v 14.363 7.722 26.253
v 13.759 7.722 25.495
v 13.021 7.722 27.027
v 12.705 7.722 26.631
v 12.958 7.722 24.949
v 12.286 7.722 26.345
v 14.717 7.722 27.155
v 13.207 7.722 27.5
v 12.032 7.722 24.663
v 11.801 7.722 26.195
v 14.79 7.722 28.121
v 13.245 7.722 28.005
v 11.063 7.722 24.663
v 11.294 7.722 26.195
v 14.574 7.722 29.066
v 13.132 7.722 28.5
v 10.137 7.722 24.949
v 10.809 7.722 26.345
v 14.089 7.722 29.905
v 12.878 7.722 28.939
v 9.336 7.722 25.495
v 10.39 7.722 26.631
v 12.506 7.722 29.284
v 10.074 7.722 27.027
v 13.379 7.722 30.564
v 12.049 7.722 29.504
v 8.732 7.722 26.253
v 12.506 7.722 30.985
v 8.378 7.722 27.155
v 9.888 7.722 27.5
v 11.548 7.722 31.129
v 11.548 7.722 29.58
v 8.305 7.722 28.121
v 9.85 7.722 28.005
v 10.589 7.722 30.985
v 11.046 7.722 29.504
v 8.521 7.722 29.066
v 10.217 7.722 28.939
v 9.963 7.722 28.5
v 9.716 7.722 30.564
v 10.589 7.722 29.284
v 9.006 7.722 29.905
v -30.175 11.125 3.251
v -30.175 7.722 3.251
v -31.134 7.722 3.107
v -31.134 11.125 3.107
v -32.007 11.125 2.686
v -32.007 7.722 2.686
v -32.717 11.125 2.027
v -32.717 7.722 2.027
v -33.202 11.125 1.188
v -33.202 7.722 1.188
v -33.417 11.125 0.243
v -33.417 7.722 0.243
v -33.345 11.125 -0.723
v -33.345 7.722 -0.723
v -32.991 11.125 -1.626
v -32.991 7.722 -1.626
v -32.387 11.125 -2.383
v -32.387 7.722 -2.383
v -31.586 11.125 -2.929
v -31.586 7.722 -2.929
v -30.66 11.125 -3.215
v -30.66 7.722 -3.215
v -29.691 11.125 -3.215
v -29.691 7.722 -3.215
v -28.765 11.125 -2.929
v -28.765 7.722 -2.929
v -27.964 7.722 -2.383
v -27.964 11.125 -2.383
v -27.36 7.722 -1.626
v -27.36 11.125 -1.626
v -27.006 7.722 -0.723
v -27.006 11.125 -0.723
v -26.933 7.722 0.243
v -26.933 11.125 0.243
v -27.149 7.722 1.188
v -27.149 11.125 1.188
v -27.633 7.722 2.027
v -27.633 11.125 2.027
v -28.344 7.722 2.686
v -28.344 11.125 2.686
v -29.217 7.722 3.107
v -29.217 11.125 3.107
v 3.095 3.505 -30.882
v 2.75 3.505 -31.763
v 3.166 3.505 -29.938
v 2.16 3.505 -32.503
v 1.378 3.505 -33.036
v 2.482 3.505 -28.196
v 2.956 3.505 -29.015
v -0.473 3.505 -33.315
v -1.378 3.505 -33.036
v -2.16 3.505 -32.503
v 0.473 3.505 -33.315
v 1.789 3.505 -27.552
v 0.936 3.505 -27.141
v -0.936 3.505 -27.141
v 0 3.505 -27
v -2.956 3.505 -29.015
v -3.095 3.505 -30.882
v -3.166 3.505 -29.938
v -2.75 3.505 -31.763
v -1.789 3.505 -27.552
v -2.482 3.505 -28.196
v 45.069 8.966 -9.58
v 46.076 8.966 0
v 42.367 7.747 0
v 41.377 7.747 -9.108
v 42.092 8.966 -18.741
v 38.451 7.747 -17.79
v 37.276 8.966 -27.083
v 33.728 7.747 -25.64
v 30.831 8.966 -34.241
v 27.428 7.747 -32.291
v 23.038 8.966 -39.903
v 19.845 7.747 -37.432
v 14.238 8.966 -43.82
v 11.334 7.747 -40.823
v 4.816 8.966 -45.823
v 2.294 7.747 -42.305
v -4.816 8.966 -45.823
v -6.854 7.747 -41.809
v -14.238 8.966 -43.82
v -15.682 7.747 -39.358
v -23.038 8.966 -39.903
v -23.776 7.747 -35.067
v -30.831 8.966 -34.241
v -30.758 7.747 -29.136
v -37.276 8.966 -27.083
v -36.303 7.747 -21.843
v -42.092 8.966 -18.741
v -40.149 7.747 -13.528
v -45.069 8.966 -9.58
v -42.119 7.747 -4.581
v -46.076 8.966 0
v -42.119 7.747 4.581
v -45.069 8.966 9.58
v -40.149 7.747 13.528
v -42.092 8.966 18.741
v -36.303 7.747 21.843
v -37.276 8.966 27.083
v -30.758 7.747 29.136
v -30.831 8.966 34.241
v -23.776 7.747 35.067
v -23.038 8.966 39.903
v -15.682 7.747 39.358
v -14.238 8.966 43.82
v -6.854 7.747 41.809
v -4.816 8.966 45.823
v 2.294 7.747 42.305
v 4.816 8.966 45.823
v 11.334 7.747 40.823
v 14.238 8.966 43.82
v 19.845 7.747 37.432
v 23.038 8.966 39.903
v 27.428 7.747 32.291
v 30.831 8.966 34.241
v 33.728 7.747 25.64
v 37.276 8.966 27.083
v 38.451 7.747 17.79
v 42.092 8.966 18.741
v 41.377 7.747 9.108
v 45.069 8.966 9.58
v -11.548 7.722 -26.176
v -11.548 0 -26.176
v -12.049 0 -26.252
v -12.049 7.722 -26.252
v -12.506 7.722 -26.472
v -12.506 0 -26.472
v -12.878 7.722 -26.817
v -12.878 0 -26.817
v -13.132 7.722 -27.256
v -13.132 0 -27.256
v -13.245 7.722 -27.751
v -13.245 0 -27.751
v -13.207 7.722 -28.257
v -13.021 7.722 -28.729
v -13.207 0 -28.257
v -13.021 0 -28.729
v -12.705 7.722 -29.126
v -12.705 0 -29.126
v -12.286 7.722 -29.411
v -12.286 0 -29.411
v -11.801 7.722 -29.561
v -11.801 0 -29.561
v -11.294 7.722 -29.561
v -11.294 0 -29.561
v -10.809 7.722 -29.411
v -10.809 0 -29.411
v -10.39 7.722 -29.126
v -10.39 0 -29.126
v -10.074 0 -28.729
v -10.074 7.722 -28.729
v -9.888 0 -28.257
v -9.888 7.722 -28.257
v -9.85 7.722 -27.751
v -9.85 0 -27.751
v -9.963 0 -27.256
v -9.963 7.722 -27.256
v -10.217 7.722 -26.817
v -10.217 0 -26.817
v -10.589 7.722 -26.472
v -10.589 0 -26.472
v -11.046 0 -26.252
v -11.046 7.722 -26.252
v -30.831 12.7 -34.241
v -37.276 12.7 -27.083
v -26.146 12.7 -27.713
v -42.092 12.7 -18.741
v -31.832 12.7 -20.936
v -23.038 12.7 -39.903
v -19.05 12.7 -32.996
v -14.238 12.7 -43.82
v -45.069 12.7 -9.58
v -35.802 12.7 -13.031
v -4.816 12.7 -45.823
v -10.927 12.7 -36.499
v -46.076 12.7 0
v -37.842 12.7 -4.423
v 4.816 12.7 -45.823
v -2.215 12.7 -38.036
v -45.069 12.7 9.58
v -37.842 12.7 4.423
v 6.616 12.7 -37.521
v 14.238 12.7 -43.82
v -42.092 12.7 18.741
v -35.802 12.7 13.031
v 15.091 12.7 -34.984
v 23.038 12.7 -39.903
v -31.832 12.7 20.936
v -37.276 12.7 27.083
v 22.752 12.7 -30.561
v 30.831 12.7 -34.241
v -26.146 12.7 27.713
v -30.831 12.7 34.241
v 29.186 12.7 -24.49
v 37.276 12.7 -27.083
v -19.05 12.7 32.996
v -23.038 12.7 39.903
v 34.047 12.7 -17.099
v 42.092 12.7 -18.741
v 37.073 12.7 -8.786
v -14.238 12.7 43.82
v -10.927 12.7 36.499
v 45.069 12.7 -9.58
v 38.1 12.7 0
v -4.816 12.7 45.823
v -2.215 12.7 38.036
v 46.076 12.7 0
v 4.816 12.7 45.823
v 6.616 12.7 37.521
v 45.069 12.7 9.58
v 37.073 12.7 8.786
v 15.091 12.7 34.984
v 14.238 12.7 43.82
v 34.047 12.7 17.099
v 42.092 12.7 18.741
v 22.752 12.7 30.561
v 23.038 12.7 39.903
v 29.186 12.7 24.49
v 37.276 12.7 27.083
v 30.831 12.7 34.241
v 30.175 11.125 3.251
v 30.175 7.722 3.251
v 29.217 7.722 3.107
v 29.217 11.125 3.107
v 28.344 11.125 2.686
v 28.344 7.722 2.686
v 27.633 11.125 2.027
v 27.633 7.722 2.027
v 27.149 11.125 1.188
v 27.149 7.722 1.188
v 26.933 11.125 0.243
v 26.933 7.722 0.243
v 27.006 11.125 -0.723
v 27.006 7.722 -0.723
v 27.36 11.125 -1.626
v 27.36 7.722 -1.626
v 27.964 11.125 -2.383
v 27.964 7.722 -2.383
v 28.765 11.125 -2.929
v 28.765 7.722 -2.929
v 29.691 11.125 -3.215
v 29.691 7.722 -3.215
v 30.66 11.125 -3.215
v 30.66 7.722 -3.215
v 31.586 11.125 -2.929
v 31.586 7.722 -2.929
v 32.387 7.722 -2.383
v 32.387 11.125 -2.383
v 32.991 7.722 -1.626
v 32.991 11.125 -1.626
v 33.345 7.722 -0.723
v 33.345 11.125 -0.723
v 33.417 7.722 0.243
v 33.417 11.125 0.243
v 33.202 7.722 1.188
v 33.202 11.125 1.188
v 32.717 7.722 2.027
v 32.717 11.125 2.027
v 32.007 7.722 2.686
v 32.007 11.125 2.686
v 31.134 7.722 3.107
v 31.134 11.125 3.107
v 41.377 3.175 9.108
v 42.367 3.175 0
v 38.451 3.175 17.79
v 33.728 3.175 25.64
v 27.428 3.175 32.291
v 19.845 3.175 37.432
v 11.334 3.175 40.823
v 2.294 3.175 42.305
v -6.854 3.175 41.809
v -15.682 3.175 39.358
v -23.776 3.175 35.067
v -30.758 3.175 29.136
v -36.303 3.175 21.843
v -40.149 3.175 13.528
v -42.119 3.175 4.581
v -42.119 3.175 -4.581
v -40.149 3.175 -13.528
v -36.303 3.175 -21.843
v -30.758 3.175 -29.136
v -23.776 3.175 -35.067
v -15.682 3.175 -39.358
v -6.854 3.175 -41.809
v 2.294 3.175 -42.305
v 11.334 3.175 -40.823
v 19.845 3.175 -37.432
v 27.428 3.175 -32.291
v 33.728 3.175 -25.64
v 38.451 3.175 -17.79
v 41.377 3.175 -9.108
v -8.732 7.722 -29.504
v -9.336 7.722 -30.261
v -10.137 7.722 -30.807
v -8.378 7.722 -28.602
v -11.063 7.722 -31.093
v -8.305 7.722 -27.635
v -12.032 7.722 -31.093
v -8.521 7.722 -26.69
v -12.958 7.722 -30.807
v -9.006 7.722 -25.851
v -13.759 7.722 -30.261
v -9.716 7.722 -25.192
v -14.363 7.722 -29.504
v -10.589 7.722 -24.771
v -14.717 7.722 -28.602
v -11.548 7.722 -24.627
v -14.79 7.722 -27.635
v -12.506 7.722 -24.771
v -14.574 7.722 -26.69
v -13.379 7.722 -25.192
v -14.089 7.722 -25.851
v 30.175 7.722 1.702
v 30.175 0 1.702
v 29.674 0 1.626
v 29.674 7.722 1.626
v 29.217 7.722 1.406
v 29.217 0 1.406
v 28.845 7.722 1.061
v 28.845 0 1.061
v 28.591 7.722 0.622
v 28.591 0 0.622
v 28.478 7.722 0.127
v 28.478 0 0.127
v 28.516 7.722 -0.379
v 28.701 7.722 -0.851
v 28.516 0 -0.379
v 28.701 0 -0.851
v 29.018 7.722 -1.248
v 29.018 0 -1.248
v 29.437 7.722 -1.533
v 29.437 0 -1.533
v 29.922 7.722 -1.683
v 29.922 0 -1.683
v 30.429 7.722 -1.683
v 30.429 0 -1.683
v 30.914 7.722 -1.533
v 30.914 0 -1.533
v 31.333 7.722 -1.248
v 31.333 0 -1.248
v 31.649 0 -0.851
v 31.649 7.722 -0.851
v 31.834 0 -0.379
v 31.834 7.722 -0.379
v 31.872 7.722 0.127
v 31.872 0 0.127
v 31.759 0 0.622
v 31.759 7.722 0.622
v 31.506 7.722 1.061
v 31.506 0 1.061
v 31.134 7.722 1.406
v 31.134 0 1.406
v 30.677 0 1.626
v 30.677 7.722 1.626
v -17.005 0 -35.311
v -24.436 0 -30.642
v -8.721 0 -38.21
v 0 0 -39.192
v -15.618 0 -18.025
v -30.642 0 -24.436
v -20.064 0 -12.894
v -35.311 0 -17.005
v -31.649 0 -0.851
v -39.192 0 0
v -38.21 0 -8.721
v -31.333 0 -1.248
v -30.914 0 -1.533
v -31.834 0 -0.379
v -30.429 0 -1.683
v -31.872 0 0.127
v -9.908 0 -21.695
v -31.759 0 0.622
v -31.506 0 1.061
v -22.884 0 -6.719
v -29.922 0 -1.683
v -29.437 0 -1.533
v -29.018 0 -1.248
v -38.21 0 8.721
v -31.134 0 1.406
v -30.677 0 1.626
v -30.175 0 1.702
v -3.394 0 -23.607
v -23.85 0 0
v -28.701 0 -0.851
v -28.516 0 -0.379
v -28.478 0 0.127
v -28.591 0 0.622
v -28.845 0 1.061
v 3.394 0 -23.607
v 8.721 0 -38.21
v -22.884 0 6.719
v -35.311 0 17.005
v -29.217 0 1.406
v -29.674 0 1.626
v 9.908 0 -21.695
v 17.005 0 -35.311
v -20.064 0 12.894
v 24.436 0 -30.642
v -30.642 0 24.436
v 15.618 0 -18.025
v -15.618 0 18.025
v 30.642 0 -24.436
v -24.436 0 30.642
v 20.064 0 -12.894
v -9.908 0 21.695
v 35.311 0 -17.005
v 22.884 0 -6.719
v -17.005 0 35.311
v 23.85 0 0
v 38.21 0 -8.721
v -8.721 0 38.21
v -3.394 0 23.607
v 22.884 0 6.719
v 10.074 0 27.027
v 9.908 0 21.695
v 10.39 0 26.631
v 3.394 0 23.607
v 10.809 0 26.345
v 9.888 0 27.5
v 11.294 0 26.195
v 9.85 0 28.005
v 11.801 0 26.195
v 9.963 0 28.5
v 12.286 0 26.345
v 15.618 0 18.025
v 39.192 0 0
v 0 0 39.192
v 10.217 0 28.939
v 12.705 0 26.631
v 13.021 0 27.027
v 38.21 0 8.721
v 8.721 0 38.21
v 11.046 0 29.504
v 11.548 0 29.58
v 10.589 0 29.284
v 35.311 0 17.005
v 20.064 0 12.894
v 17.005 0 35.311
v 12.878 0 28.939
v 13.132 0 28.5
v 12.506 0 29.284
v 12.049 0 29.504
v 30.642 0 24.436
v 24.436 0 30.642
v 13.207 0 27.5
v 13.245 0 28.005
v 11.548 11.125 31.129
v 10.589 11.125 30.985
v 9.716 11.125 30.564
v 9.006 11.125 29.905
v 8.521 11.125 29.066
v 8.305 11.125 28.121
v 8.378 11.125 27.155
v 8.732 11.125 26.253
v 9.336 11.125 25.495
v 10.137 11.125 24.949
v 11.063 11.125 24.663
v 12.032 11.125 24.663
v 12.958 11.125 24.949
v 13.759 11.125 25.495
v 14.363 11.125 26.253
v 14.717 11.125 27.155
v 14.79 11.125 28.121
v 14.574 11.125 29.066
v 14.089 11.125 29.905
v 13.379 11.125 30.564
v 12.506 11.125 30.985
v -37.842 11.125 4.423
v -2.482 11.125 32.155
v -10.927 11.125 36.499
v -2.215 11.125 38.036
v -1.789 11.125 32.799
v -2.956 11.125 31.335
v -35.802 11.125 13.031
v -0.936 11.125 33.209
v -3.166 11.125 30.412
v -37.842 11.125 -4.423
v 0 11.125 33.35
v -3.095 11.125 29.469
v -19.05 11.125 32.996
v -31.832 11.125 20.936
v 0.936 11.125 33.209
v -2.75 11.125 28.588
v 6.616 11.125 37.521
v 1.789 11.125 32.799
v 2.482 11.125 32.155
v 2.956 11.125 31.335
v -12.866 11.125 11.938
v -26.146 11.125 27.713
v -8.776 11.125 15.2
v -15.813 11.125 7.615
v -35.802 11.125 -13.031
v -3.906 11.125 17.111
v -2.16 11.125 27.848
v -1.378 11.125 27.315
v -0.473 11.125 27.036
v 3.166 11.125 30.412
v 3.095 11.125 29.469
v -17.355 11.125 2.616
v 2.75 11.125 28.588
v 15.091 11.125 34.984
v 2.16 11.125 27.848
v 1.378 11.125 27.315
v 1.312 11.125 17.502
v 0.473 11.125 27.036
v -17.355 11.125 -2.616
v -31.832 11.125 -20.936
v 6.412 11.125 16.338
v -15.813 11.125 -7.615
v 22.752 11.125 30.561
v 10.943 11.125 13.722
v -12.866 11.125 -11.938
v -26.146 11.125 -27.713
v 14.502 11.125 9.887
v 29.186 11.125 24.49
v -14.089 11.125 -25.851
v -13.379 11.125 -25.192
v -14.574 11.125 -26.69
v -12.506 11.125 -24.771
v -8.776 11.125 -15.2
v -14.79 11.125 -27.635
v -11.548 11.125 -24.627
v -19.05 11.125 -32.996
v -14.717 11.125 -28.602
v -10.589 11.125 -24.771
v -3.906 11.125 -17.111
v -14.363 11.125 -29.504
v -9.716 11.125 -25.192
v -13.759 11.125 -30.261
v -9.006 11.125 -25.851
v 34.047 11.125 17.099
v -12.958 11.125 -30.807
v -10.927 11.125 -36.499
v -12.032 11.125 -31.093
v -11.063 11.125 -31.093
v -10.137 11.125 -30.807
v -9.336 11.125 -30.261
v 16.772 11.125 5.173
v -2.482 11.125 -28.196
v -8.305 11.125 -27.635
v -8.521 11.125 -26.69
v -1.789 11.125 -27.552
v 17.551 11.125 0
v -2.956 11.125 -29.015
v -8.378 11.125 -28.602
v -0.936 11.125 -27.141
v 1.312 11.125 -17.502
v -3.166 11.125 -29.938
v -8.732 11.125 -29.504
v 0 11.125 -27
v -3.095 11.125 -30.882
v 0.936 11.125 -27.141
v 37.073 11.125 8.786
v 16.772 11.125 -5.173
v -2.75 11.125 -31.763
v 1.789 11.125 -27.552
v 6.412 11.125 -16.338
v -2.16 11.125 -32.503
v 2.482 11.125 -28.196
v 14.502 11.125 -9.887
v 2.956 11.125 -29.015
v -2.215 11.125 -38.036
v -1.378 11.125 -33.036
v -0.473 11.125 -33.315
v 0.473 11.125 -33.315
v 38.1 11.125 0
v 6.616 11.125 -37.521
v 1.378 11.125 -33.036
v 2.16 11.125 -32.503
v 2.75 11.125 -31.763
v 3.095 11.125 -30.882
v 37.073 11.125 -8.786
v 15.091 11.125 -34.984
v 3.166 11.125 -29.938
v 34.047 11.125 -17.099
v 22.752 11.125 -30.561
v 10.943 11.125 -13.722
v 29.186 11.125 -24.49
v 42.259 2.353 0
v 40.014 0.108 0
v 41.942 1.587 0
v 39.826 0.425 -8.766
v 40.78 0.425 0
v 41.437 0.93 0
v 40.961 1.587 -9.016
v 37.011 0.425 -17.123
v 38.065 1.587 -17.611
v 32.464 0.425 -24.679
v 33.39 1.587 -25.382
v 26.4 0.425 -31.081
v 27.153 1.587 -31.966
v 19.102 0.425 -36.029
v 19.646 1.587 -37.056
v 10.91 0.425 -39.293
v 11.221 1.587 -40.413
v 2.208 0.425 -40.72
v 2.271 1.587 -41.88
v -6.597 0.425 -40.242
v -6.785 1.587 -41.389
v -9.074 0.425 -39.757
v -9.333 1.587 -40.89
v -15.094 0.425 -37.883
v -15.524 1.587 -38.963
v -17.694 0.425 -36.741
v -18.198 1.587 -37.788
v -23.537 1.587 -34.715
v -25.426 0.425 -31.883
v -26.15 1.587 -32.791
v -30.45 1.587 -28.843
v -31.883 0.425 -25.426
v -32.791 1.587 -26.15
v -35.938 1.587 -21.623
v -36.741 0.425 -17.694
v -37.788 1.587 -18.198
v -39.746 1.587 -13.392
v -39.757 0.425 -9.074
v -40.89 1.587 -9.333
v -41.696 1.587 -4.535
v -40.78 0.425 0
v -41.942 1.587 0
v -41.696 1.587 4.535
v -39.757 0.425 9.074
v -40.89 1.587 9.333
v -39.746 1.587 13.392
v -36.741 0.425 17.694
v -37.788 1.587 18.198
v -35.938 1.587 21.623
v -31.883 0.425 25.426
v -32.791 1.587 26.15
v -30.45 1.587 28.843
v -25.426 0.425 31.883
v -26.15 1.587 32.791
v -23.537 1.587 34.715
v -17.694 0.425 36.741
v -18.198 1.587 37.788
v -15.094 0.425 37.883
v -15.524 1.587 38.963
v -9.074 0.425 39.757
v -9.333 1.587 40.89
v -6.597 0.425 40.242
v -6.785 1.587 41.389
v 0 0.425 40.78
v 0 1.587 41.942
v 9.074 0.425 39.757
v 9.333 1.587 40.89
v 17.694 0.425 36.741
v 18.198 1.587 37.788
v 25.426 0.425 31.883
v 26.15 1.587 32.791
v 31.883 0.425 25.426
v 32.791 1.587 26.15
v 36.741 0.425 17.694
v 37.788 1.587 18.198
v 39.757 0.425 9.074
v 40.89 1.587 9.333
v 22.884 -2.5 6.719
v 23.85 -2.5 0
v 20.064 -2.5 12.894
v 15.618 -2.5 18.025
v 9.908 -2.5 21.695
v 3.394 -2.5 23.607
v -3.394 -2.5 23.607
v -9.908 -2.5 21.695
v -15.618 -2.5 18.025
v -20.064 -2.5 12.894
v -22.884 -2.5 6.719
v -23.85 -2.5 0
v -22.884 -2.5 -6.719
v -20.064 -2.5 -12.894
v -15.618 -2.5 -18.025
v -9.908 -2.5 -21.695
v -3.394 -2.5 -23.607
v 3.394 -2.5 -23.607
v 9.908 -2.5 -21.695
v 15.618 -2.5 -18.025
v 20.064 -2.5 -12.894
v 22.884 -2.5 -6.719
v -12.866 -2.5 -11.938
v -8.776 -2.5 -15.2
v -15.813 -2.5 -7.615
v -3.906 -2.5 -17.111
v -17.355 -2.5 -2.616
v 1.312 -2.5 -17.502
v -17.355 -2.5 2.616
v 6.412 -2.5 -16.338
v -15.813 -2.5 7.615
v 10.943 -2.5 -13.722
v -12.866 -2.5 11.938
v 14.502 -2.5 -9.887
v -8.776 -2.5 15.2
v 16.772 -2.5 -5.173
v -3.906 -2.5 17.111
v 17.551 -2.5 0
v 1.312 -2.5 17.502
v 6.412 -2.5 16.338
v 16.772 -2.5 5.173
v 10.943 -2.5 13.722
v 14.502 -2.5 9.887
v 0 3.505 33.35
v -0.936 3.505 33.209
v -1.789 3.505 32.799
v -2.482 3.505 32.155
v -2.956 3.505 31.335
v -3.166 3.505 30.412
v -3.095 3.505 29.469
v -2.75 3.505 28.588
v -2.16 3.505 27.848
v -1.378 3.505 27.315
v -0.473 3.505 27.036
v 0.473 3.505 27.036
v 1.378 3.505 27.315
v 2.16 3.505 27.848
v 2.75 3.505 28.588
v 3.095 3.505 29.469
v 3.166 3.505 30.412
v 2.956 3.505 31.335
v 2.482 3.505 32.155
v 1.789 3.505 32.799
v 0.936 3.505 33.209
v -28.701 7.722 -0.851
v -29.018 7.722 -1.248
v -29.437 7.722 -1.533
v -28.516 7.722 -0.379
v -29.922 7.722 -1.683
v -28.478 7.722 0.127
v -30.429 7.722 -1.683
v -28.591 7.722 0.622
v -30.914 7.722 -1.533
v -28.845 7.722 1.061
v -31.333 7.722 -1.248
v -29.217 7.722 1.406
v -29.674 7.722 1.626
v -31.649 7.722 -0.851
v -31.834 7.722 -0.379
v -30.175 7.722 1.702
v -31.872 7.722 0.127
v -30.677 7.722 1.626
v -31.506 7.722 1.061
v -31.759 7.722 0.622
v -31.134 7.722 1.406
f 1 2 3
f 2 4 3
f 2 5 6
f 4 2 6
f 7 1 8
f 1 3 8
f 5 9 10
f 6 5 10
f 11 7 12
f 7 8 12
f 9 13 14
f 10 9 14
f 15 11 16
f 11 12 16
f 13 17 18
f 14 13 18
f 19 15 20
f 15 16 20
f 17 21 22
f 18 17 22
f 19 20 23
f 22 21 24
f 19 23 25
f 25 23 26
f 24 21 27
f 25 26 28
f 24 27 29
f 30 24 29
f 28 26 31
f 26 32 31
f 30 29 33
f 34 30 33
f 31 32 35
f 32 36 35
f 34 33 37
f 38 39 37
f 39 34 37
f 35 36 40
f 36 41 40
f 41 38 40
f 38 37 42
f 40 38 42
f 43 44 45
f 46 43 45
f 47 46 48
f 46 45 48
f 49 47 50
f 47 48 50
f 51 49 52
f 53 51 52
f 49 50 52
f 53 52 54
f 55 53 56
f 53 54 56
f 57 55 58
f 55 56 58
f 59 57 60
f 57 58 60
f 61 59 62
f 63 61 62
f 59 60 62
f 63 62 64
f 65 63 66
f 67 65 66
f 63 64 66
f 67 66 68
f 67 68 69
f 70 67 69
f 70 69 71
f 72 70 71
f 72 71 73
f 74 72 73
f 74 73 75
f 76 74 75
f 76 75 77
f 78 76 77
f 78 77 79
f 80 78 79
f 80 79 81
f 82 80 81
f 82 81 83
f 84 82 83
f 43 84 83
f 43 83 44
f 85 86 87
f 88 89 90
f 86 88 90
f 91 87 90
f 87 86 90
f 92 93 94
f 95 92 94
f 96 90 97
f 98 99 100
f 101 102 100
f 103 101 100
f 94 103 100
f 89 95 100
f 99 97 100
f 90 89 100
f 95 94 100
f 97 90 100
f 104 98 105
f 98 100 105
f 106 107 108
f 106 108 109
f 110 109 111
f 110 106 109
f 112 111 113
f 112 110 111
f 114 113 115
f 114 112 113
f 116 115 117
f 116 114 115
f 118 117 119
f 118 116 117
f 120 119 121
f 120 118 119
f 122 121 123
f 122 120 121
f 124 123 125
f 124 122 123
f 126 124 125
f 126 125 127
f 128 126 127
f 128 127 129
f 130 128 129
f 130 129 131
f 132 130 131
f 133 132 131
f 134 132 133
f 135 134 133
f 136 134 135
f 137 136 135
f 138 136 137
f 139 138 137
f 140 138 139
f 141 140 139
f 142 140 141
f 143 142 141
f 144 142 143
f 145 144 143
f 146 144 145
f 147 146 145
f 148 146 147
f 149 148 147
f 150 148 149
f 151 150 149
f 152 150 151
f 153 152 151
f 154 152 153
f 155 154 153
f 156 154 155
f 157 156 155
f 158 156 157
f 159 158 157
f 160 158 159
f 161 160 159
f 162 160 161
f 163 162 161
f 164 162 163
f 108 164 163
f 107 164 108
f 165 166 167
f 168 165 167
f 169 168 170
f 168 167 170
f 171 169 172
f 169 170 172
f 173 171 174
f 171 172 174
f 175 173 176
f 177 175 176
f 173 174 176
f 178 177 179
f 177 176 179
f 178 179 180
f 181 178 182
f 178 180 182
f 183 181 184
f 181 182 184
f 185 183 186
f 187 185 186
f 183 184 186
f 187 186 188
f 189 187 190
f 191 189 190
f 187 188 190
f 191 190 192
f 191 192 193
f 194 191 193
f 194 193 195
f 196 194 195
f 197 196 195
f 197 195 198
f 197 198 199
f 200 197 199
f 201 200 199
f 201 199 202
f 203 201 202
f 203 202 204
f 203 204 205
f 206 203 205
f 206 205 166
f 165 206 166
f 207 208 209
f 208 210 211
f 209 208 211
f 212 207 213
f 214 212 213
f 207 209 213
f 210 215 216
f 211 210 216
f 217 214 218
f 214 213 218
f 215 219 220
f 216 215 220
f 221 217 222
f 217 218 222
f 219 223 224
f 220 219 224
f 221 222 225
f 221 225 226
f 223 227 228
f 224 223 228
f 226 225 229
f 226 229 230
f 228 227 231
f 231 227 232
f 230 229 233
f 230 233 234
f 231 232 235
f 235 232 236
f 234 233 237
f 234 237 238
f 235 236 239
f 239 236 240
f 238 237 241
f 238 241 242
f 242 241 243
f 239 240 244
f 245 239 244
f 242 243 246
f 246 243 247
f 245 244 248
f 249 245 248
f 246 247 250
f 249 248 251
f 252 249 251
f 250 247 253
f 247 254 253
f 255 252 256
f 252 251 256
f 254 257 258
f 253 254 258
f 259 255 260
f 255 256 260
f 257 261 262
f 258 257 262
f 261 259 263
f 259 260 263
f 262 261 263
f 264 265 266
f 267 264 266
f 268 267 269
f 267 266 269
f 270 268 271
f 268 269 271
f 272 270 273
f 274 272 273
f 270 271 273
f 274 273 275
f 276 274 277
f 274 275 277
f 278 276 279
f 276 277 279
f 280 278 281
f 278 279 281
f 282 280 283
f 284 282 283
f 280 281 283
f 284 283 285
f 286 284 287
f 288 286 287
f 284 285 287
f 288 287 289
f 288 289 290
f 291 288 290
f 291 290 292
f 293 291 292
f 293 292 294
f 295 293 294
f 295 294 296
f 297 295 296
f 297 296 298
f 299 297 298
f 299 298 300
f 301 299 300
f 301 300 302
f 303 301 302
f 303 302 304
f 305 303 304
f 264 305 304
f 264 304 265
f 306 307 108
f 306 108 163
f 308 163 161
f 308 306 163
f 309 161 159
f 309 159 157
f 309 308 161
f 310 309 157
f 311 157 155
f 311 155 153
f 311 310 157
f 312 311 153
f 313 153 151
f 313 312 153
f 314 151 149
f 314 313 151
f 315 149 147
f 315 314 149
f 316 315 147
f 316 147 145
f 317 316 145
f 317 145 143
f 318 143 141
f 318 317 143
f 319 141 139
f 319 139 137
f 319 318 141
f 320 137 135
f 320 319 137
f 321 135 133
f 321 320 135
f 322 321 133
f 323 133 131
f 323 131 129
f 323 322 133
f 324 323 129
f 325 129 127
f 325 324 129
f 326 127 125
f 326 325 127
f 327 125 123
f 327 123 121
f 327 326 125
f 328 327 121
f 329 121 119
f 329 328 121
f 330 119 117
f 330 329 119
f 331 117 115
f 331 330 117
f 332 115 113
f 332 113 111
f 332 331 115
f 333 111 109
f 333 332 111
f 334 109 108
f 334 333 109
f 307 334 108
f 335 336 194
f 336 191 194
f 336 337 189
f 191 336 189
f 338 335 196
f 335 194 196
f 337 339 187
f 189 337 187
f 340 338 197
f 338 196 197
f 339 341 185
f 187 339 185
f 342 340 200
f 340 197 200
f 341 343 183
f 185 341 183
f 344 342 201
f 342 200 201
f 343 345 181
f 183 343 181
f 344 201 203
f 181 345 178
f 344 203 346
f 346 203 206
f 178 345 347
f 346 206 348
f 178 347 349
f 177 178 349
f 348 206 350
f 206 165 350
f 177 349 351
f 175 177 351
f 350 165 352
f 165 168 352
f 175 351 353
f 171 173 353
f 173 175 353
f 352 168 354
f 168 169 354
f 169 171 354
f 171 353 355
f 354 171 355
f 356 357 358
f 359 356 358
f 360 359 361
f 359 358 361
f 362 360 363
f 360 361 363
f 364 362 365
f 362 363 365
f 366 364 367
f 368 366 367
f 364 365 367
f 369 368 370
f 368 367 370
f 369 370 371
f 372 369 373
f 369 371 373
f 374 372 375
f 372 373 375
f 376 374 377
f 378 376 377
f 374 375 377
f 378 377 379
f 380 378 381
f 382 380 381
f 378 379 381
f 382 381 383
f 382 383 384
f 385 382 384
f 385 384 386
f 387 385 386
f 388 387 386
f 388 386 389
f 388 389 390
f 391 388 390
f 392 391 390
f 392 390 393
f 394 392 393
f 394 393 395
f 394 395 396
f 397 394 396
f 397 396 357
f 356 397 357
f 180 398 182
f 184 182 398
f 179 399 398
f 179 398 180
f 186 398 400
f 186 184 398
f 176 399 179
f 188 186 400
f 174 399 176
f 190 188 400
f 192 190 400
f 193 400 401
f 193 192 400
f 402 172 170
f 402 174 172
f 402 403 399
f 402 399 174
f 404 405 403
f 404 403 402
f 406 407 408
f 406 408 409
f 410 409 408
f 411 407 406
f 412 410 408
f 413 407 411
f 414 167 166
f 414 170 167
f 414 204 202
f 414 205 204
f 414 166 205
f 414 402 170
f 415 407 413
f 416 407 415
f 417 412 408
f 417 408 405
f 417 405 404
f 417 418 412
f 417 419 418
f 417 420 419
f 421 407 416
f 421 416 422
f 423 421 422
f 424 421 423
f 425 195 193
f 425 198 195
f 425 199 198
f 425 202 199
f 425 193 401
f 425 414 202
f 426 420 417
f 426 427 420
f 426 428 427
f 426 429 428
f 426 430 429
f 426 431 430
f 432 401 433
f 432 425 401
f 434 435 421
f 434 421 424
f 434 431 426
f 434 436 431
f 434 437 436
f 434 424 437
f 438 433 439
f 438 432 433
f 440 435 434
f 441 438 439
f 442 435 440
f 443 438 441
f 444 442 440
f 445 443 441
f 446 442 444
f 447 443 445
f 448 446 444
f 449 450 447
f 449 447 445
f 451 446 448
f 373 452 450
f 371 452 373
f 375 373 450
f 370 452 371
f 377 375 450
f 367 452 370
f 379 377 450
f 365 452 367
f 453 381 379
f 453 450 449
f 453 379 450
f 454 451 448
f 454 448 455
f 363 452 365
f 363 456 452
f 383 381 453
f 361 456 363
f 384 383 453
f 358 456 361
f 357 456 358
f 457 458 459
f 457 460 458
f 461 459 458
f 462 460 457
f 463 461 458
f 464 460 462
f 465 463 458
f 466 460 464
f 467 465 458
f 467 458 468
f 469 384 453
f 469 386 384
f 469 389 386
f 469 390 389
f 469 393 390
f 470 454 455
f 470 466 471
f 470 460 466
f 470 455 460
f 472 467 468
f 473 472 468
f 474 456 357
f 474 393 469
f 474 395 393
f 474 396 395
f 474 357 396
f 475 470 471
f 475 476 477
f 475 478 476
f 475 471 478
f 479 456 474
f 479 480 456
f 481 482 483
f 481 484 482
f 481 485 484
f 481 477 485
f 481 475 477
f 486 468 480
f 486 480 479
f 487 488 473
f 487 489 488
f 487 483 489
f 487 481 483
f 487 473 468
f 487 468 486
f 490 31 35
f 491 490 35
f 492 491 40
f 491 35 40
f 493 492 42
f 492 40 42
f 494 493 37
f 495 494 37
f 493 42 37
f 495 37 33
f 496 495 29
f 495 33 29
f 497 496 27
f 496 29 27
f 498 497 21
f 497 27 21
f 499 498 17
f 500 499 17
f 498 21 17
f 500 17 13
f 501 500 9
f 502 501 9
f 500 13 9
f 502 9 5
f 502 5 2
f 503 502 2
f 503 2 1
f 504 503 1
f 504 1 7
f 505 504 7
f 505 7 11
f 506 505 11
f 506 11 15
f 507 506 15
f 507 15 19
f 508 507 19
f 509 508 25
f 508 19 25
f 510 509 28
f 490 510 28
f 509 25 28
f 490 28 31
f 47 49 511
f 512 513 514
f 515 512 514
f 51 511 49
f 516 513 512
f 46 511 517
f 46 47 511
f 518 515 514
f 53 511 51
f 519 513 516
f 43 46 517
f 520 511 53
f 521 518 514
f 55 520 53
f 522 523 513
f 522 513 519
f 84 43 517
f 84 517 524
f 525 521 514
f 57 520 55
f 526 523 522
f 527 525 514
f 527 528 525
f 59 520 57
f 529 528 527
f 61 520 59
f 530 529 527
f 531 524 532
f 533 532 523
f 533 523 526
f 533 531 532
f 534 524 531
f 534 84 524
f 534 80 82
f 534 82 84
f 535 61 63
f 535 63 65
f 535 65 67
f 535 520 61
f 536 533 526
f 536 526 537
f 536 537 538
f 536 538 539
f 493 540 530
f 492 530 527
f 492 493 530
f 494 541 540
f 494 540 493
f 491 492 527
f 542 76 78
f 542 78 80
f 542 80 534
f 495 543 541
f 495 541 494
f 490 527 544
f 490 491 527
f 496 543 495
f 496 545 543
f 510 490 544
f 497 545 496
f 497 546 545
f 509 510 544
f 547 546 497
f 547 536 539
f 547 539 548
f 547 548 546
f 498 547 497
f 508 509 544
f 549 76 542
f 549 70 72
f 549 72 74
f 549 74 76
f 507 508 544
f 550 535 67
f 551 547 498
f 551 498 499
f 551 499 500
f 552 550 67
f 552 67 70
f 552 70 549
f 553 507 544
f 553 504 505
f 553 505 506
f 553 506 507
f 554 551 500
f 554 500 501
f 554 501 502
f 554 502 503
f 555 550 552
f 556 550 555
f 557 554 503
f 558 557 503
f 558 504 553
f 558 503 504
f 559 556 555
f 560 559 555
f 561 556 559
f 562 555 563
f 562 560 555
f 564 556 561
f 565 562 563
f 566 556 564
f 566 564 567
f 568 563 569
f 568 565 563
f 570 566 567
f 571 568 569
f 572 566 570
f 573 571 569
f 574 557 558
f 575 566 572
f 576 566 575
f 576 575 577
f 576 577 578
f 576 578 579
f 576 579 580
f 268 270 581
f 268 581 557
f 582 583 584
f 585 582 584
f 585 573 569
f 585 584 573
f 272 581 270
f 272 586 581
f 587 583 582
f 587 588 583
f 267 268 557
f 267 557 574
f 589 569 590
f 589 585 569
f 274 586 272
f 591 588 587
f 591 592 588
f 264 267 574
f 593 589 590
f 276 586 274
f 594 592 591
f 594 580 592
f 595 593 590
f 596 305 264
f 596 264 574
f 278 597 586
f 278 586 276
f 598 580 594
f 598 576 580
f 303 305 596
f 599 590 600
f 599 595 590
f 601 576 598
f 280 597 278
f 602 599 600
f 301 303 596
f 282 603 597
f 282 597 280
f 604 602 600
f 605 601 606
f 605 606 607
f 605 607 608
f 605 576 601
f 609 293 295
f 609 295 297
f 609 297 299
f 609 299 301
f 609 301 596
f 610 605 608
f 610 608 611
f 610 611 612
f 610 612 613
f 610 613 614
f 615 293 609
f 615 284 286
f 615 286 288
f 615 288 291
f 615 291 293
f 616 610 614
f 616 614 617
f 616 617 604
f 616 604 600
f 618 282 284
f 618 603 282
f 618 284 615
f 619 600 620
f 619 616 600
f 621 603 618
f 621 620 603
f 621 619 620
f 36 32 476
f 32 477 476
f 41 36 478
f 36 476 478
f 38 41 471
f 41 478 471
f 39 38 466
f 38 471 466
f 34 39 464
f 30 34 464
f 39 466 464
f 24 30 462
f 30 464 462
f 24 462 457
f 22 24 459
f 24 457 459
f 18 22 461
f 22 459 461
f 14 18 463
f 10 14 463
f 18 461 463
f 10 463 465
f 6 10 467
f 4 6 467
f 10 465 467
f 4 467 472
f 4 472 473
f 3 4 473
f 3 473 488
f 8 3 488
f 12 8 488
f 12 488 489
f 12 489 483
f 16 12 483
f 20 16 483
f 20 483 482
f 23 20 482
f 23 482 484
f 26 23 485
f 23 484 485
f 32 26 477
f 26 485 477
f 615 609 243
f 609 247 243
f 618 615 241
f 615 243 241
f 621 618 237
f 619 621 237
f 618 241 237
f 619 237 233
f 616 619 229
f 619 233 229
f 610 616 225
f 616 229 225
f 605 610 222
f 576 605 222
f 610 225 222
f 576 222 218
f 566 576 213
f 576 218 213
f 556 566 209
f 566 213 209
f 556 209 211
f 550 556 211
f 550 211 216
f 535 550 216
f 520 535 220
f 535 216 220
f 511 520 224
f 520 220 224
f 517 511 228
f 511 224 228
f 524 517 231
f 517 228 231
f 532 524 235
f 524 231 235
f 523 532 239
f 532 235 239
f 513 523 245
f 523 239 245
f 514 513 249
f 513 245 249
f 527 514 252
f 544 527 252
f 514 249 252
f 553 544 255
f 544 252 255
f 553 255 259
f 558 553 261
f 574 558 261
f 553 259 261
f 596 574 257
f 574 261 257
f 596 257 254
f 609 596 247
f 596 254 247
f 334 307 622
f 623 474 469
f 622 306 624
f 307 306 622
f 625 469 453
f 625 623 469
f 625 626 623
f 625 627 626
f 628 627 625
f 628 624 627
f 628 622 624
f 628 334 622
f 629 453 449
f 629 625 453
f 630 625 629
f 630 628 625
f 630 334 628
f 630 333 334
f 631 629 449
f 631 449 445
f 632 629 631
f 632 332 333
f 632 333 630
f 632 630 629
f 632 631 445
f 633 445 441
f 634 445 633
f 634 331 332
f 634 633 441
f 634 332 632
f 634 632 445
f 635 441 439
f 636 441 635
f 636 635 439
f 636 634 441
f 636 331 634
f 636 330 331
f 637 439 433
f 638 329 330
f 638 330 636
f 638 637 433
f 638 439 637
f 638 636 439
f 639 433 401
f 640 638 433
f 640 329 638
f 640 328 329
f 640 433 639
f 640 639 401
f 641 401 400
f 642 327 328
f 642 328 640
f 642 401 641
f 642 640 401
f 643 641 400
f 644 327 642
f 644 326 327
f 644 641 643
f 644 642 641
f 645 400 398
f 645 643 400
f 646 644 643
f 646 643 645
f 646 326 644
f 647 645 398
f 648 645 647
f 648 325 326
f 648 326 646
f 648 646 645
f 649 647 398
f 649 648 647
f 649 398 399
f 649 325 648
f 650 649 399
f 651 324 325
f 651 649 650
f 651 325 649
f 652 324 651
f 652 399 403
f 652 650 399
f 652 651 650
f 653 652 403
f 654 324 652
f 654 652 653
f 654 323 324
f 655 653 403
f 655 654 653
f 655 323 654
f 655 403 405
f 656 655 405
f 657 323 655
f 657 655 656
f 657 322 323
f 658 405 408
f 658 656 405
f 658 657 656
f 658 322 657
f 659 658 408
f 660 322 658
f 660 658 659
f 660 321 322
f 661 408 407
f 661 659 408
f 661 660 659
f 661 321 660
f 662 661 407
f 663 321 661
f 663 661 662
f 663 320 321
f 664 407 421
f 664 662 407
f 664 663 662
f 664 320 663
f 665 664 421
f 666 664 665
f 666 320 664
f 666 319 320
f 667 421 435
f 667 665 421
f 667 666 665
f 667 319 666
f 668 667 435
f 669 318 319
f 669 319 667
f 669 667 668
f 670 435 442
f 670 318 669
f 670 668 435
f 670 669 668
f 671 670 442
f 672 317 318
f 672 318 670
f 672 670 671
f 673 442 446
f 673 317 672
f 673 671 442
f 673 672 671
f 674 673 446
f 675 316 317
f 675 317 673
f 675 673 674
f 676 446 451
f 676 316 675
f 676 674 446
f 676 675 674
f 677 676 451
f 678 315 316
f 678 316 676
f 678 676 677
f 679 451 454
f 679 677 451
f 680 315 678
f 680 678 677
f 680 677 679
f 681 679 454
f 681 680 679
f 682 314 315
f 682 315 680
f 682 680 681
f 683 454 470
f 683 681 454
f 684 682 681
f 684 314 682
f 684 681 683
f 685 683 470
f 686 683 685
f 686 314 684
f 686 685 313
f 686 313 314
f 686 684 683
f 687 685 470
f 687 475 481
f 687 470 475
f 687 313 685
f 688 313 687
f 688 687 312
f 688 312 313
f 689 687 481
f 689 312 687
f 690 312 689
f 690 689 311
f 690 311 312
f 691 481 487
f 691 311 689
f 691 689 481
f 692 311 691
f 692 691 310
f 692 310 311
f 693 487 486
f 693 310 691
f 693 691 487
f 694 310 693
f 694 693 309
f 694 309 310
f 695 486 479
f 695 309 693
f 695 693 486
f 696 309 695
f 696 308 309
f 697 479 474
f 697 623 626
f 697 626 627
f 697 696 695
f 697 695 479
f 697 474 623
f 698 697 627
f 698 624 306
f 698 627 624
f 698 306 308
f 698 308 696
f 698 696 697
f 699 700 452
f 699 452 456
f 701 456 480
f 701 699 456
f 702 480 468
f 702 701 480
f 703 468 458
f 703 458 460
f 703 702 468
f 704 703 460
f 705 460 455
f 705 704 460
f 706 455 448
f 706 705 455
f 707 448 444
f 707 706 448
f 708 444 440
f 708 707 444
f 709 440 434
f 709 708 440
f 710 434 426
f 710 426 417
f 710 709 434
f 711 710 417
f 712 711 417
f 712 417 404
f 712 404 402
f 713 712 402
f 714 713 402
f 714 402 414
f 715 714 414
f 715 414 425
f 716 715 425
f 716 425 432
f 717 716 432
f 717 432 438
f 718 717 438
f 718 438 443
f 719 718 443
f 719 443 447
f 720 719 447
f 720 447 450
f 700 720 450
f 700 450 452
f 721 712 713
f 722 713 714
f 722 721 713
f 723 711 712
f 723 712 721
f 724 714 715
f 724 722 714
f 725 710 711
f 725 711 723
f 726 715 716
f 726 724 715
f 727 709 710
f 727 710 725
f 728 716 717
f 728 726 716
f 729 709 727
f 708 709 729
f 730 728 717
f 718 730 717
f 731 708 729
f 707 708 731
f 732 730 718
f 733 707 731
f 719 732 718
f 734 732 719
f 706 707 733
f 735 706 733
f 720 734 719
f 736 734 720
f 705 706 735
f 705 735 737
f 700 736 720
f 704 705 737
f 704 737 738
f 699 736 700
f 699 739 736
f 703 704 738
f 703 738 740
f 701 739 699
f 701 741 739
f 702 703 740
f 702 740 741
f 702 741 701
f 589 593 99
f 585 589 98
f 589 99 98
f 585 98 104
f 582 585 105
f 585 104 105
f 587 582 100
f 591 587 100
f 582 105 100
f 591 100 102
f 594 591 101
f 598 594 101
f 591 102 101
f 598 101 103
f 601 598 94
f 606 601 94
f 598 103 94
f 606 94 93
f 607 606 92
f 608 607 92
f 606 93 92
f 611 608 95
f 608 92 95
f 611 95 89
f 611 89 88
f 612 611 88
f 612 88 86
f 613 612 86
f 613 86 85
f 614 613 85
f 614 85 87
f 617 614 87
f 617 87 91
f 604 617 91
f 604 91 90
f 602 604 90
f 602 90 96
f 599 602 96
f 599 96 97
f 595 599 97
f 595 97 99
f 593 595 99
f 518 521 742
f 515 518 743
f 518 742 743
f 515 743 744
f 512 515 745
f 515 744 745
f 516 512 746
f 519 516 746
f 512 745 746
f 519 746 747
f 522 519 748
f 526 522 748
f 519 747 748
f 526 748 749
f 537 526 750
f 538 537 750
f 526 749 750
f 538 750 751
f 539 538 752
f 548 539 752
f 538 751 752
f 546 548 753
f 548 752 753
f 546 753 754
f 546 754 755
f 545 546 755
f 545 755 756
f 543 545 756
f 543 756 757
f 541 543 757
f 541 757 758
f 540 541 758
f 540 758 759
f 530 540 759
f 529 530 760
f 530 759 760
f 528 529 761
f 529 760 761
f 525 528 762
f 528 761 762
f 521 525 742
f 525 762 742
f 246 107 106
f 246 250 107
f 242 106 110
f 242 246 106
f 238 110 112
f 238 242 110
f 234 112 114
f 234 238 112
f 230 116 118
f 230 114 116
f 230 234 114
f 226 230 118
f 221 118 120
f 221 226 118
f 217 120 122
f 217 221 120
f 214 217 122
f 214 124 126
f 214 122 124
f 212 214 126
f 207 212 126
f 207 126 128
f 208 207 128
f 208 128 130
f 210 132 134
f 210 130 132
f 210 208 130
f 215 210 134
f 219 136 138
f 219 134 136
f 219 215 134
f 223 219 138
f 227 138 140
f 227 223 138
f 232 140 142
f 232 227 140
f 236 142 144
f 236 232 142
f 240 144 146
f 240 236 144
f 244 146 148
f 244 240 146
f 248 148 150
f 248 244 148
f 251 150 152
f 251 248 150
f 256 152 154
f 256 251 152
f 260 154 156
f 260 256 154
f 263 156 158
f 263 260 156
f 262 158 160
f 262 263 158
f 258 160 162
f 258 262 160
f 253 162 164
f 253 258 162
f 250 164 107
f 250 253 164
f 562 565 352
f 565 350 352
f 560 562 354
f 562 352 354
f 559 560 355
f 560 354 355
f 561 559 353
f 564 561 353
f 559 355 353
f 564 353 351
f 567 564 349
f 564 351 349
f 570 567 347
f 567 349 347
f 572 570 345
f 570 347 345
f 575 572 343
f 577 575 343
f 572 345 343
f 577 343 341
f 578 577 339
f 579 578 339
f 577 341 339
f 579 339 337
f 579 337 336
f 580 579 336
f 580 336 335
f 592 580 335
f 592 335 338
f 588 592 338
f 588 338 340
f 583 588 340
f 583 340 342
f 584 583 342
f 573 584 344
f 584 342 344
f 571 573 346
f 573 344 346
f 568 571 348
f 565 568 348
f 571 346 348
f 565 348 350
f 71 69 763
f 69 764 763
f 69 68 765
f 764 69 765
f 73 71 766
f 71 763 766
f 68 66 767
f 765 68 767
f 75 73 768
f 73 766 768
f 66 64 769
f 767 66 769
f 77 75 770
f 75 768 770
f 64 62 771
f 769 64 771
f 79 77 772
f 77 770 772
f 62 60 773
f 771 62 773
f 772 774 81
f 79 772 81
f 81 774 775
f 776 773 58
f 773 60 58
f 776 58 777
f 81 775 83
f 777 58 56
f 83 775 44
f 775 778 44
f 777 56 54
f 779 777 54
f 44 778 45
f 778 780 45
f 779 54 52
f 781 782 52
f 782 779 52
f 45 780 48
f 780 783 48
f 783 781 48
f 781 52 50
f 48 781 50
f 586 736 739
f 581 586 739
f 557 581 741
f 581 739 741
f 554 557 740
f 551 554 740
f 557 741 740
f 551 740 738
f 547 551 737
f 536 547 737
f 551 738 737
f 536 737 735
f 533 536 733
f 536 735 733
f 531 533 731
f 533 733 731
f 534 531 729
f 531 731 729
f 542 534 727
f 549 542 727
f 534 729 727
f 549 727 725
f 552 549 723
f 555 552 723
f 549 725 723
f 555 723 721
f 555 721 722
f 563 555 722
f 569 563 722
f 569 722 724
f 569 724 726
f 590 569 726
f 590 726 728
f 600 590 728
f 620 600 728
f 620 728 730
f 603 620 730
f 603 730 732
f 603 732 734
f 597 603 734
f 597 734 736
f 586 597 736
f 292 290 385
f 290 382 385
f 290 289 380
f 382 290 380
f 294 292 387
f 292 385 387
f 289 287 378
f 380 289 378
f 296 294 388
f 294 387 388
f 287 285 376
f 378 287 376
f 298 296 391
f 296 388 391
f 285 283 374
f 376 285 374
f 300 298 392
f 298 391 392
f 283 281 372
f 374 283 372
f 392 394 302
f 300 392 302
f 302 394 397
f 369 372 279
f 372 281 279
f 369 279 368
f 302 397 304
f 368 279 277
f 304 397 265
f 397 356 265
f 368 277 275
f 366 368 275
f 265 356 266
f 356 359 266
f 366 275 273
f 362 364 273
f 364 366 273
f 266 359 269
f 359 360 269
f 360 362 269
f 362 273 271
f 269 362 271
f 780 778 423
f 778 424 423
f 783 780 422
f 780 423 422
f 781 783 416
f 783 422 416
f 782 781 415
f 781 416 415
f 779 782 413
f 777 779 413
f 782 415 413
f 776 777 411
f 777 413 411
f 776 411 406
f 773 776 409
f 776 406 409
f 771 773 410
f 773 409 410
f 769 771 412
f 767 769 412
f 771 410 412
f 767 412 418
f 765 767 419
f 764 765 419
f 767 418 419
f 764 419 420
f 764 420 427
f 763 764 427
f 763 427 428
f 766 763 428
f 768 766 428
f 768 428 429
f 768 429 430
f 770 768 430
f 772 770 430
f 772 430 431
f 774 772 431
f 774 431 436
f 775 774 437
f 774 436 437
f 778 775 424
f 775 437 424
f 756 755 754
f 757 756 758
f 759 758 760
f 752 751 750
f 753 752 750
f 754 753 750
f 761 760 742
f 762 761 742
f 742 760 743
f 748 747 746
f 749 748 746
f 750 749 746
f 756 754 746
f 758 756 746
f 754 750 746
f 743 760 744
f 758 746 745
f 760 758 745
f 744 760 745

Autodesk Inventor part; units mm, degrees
ref_plane "YZ Plane" through (0, 0, 0) normal (1, 0, 0) x (0, 1, 0)
ref_plane "XZ Plane" through (0, 0, 0) normal (0, 1, 0) x (-1, 0, 0)
ref_plane "XY Plane" through (0, 0, 0) normal (0, 0, 1) x (1, 0, 0)
sketch "Sketch1" plane through (0, 0, 0) normal (0, 0, 1) x (1, 0, 0)
  line L0 (23.85, 0) -> (46.0756, 0)
  line L1 (46.0756, 0) -> (46.0756, 12.7)
  line L2 (46.0756, 12.7) -> (0, 12.7)
  line L3 (0, 12.7) -> (0, 0)
  line L4 (17.5514, 12.7) -> (17.5514, -2.5)
  line L5 (46.0756, 8.9662) -> (42.3672, 8.9662)
  line L6 (42.3672, 7.747) -> (42.3672, 0)
  line L7 (46.0756, 7.747) -> (42.3672, 7.747)
  line L8 (46.0756, 8.9662) -> (42.3672, 7.747)
  line L9 (0, 11.1252) -> (0, 12.7)
  line L10 (17.5514, 0) -> (23.85, 0)
  line L11 (23.85, 0) -> (23.85, -2.5)
  line L12 (23.85, -2.5) -> (0, -2.5)
  line L13 (0, -2.5) -> (0, 0)
  dimension "d0" = 46.0756
  dimension "d1" = 12.7
  dimension "d2" = 17.5514
  dimension "d3" = 3.7338
  dimension "d4" = 42.3672
  dimension "d6" = 4.953
  dimension "d14" = 23.85
  dimension "d15" = 2.5
revolve "Revolution1" add sketch "Sketch1" angle 360 about axis through (0, 12.7, 0) along (0, -1, 0) contours L10 L4 L2 L1 L8 L6 L0 | L11 L12 L4 L10
sketch "Sketch2" plane through (0, 12.7, 0) normal (0, 1, 0) x (1, 0, 0)
  circle A0 centre (0, 0) radius 38.1
  dimension "d11" = 76.2
extrude "Extrusion1" cut sketch "Sketch2" against normal blind 1.5748
sketch "Sketch4" plane through (0, 11.1252, 0) normal (0, 1, 0) x (1, 0, 0)
  circle A0 centre (0, 0) radius 30.1752
  line L0 (-11.5475, 27.8782) -> (11.5475, -27.8782)
  circle A1 centre (0, 0) radius 17.5514 projected
  line L1 (0, 0) -> (0, -30.1752)
  circle A2 centre (30.1752, 0) radius 3.2512 projected
  circle A3 centre (-30.1752, 0) radius 1.7018 projected
  dimension "d25" = 60.3504
  dimension "d27" = 22.5
hole "Hole2" at (-11.5475, 11.1252, -27.8782) at (11.5475, 11.1252, 27.8782) at (30.1752, 11.1252, 0) at (-30.1752, 11.1252, 0) direction (0, -1, 0) diameter 3.4036 end through all counterbore diameter 6.5024 counterbore depth 3.4036 clearance for "Socket Head Cap Screw ISO 4762" size "M3" standard "ISO"
sketch "Sketch5" plane through (0, 11.1252, 0) normal (0, 1, 0) x (1, 0, 0)
  circle A0 centre (0, 0) radius 30.1752
  point P0 (0, 30.1752)
  point P1 (0, -30.1752)
  dimension "d35" = 60.3504
hole "Hole3" at (0, 11.1252, -30.1752) at (0, 11.1252, 30.1752) direction (0, -1, 0) diameter 6.35 depth 7.62
fillet "Fillet1" radius 3.175 1 edges at (-42.3672, 0, 0)
properties part number "2016.06.09 Mount Adapter"
